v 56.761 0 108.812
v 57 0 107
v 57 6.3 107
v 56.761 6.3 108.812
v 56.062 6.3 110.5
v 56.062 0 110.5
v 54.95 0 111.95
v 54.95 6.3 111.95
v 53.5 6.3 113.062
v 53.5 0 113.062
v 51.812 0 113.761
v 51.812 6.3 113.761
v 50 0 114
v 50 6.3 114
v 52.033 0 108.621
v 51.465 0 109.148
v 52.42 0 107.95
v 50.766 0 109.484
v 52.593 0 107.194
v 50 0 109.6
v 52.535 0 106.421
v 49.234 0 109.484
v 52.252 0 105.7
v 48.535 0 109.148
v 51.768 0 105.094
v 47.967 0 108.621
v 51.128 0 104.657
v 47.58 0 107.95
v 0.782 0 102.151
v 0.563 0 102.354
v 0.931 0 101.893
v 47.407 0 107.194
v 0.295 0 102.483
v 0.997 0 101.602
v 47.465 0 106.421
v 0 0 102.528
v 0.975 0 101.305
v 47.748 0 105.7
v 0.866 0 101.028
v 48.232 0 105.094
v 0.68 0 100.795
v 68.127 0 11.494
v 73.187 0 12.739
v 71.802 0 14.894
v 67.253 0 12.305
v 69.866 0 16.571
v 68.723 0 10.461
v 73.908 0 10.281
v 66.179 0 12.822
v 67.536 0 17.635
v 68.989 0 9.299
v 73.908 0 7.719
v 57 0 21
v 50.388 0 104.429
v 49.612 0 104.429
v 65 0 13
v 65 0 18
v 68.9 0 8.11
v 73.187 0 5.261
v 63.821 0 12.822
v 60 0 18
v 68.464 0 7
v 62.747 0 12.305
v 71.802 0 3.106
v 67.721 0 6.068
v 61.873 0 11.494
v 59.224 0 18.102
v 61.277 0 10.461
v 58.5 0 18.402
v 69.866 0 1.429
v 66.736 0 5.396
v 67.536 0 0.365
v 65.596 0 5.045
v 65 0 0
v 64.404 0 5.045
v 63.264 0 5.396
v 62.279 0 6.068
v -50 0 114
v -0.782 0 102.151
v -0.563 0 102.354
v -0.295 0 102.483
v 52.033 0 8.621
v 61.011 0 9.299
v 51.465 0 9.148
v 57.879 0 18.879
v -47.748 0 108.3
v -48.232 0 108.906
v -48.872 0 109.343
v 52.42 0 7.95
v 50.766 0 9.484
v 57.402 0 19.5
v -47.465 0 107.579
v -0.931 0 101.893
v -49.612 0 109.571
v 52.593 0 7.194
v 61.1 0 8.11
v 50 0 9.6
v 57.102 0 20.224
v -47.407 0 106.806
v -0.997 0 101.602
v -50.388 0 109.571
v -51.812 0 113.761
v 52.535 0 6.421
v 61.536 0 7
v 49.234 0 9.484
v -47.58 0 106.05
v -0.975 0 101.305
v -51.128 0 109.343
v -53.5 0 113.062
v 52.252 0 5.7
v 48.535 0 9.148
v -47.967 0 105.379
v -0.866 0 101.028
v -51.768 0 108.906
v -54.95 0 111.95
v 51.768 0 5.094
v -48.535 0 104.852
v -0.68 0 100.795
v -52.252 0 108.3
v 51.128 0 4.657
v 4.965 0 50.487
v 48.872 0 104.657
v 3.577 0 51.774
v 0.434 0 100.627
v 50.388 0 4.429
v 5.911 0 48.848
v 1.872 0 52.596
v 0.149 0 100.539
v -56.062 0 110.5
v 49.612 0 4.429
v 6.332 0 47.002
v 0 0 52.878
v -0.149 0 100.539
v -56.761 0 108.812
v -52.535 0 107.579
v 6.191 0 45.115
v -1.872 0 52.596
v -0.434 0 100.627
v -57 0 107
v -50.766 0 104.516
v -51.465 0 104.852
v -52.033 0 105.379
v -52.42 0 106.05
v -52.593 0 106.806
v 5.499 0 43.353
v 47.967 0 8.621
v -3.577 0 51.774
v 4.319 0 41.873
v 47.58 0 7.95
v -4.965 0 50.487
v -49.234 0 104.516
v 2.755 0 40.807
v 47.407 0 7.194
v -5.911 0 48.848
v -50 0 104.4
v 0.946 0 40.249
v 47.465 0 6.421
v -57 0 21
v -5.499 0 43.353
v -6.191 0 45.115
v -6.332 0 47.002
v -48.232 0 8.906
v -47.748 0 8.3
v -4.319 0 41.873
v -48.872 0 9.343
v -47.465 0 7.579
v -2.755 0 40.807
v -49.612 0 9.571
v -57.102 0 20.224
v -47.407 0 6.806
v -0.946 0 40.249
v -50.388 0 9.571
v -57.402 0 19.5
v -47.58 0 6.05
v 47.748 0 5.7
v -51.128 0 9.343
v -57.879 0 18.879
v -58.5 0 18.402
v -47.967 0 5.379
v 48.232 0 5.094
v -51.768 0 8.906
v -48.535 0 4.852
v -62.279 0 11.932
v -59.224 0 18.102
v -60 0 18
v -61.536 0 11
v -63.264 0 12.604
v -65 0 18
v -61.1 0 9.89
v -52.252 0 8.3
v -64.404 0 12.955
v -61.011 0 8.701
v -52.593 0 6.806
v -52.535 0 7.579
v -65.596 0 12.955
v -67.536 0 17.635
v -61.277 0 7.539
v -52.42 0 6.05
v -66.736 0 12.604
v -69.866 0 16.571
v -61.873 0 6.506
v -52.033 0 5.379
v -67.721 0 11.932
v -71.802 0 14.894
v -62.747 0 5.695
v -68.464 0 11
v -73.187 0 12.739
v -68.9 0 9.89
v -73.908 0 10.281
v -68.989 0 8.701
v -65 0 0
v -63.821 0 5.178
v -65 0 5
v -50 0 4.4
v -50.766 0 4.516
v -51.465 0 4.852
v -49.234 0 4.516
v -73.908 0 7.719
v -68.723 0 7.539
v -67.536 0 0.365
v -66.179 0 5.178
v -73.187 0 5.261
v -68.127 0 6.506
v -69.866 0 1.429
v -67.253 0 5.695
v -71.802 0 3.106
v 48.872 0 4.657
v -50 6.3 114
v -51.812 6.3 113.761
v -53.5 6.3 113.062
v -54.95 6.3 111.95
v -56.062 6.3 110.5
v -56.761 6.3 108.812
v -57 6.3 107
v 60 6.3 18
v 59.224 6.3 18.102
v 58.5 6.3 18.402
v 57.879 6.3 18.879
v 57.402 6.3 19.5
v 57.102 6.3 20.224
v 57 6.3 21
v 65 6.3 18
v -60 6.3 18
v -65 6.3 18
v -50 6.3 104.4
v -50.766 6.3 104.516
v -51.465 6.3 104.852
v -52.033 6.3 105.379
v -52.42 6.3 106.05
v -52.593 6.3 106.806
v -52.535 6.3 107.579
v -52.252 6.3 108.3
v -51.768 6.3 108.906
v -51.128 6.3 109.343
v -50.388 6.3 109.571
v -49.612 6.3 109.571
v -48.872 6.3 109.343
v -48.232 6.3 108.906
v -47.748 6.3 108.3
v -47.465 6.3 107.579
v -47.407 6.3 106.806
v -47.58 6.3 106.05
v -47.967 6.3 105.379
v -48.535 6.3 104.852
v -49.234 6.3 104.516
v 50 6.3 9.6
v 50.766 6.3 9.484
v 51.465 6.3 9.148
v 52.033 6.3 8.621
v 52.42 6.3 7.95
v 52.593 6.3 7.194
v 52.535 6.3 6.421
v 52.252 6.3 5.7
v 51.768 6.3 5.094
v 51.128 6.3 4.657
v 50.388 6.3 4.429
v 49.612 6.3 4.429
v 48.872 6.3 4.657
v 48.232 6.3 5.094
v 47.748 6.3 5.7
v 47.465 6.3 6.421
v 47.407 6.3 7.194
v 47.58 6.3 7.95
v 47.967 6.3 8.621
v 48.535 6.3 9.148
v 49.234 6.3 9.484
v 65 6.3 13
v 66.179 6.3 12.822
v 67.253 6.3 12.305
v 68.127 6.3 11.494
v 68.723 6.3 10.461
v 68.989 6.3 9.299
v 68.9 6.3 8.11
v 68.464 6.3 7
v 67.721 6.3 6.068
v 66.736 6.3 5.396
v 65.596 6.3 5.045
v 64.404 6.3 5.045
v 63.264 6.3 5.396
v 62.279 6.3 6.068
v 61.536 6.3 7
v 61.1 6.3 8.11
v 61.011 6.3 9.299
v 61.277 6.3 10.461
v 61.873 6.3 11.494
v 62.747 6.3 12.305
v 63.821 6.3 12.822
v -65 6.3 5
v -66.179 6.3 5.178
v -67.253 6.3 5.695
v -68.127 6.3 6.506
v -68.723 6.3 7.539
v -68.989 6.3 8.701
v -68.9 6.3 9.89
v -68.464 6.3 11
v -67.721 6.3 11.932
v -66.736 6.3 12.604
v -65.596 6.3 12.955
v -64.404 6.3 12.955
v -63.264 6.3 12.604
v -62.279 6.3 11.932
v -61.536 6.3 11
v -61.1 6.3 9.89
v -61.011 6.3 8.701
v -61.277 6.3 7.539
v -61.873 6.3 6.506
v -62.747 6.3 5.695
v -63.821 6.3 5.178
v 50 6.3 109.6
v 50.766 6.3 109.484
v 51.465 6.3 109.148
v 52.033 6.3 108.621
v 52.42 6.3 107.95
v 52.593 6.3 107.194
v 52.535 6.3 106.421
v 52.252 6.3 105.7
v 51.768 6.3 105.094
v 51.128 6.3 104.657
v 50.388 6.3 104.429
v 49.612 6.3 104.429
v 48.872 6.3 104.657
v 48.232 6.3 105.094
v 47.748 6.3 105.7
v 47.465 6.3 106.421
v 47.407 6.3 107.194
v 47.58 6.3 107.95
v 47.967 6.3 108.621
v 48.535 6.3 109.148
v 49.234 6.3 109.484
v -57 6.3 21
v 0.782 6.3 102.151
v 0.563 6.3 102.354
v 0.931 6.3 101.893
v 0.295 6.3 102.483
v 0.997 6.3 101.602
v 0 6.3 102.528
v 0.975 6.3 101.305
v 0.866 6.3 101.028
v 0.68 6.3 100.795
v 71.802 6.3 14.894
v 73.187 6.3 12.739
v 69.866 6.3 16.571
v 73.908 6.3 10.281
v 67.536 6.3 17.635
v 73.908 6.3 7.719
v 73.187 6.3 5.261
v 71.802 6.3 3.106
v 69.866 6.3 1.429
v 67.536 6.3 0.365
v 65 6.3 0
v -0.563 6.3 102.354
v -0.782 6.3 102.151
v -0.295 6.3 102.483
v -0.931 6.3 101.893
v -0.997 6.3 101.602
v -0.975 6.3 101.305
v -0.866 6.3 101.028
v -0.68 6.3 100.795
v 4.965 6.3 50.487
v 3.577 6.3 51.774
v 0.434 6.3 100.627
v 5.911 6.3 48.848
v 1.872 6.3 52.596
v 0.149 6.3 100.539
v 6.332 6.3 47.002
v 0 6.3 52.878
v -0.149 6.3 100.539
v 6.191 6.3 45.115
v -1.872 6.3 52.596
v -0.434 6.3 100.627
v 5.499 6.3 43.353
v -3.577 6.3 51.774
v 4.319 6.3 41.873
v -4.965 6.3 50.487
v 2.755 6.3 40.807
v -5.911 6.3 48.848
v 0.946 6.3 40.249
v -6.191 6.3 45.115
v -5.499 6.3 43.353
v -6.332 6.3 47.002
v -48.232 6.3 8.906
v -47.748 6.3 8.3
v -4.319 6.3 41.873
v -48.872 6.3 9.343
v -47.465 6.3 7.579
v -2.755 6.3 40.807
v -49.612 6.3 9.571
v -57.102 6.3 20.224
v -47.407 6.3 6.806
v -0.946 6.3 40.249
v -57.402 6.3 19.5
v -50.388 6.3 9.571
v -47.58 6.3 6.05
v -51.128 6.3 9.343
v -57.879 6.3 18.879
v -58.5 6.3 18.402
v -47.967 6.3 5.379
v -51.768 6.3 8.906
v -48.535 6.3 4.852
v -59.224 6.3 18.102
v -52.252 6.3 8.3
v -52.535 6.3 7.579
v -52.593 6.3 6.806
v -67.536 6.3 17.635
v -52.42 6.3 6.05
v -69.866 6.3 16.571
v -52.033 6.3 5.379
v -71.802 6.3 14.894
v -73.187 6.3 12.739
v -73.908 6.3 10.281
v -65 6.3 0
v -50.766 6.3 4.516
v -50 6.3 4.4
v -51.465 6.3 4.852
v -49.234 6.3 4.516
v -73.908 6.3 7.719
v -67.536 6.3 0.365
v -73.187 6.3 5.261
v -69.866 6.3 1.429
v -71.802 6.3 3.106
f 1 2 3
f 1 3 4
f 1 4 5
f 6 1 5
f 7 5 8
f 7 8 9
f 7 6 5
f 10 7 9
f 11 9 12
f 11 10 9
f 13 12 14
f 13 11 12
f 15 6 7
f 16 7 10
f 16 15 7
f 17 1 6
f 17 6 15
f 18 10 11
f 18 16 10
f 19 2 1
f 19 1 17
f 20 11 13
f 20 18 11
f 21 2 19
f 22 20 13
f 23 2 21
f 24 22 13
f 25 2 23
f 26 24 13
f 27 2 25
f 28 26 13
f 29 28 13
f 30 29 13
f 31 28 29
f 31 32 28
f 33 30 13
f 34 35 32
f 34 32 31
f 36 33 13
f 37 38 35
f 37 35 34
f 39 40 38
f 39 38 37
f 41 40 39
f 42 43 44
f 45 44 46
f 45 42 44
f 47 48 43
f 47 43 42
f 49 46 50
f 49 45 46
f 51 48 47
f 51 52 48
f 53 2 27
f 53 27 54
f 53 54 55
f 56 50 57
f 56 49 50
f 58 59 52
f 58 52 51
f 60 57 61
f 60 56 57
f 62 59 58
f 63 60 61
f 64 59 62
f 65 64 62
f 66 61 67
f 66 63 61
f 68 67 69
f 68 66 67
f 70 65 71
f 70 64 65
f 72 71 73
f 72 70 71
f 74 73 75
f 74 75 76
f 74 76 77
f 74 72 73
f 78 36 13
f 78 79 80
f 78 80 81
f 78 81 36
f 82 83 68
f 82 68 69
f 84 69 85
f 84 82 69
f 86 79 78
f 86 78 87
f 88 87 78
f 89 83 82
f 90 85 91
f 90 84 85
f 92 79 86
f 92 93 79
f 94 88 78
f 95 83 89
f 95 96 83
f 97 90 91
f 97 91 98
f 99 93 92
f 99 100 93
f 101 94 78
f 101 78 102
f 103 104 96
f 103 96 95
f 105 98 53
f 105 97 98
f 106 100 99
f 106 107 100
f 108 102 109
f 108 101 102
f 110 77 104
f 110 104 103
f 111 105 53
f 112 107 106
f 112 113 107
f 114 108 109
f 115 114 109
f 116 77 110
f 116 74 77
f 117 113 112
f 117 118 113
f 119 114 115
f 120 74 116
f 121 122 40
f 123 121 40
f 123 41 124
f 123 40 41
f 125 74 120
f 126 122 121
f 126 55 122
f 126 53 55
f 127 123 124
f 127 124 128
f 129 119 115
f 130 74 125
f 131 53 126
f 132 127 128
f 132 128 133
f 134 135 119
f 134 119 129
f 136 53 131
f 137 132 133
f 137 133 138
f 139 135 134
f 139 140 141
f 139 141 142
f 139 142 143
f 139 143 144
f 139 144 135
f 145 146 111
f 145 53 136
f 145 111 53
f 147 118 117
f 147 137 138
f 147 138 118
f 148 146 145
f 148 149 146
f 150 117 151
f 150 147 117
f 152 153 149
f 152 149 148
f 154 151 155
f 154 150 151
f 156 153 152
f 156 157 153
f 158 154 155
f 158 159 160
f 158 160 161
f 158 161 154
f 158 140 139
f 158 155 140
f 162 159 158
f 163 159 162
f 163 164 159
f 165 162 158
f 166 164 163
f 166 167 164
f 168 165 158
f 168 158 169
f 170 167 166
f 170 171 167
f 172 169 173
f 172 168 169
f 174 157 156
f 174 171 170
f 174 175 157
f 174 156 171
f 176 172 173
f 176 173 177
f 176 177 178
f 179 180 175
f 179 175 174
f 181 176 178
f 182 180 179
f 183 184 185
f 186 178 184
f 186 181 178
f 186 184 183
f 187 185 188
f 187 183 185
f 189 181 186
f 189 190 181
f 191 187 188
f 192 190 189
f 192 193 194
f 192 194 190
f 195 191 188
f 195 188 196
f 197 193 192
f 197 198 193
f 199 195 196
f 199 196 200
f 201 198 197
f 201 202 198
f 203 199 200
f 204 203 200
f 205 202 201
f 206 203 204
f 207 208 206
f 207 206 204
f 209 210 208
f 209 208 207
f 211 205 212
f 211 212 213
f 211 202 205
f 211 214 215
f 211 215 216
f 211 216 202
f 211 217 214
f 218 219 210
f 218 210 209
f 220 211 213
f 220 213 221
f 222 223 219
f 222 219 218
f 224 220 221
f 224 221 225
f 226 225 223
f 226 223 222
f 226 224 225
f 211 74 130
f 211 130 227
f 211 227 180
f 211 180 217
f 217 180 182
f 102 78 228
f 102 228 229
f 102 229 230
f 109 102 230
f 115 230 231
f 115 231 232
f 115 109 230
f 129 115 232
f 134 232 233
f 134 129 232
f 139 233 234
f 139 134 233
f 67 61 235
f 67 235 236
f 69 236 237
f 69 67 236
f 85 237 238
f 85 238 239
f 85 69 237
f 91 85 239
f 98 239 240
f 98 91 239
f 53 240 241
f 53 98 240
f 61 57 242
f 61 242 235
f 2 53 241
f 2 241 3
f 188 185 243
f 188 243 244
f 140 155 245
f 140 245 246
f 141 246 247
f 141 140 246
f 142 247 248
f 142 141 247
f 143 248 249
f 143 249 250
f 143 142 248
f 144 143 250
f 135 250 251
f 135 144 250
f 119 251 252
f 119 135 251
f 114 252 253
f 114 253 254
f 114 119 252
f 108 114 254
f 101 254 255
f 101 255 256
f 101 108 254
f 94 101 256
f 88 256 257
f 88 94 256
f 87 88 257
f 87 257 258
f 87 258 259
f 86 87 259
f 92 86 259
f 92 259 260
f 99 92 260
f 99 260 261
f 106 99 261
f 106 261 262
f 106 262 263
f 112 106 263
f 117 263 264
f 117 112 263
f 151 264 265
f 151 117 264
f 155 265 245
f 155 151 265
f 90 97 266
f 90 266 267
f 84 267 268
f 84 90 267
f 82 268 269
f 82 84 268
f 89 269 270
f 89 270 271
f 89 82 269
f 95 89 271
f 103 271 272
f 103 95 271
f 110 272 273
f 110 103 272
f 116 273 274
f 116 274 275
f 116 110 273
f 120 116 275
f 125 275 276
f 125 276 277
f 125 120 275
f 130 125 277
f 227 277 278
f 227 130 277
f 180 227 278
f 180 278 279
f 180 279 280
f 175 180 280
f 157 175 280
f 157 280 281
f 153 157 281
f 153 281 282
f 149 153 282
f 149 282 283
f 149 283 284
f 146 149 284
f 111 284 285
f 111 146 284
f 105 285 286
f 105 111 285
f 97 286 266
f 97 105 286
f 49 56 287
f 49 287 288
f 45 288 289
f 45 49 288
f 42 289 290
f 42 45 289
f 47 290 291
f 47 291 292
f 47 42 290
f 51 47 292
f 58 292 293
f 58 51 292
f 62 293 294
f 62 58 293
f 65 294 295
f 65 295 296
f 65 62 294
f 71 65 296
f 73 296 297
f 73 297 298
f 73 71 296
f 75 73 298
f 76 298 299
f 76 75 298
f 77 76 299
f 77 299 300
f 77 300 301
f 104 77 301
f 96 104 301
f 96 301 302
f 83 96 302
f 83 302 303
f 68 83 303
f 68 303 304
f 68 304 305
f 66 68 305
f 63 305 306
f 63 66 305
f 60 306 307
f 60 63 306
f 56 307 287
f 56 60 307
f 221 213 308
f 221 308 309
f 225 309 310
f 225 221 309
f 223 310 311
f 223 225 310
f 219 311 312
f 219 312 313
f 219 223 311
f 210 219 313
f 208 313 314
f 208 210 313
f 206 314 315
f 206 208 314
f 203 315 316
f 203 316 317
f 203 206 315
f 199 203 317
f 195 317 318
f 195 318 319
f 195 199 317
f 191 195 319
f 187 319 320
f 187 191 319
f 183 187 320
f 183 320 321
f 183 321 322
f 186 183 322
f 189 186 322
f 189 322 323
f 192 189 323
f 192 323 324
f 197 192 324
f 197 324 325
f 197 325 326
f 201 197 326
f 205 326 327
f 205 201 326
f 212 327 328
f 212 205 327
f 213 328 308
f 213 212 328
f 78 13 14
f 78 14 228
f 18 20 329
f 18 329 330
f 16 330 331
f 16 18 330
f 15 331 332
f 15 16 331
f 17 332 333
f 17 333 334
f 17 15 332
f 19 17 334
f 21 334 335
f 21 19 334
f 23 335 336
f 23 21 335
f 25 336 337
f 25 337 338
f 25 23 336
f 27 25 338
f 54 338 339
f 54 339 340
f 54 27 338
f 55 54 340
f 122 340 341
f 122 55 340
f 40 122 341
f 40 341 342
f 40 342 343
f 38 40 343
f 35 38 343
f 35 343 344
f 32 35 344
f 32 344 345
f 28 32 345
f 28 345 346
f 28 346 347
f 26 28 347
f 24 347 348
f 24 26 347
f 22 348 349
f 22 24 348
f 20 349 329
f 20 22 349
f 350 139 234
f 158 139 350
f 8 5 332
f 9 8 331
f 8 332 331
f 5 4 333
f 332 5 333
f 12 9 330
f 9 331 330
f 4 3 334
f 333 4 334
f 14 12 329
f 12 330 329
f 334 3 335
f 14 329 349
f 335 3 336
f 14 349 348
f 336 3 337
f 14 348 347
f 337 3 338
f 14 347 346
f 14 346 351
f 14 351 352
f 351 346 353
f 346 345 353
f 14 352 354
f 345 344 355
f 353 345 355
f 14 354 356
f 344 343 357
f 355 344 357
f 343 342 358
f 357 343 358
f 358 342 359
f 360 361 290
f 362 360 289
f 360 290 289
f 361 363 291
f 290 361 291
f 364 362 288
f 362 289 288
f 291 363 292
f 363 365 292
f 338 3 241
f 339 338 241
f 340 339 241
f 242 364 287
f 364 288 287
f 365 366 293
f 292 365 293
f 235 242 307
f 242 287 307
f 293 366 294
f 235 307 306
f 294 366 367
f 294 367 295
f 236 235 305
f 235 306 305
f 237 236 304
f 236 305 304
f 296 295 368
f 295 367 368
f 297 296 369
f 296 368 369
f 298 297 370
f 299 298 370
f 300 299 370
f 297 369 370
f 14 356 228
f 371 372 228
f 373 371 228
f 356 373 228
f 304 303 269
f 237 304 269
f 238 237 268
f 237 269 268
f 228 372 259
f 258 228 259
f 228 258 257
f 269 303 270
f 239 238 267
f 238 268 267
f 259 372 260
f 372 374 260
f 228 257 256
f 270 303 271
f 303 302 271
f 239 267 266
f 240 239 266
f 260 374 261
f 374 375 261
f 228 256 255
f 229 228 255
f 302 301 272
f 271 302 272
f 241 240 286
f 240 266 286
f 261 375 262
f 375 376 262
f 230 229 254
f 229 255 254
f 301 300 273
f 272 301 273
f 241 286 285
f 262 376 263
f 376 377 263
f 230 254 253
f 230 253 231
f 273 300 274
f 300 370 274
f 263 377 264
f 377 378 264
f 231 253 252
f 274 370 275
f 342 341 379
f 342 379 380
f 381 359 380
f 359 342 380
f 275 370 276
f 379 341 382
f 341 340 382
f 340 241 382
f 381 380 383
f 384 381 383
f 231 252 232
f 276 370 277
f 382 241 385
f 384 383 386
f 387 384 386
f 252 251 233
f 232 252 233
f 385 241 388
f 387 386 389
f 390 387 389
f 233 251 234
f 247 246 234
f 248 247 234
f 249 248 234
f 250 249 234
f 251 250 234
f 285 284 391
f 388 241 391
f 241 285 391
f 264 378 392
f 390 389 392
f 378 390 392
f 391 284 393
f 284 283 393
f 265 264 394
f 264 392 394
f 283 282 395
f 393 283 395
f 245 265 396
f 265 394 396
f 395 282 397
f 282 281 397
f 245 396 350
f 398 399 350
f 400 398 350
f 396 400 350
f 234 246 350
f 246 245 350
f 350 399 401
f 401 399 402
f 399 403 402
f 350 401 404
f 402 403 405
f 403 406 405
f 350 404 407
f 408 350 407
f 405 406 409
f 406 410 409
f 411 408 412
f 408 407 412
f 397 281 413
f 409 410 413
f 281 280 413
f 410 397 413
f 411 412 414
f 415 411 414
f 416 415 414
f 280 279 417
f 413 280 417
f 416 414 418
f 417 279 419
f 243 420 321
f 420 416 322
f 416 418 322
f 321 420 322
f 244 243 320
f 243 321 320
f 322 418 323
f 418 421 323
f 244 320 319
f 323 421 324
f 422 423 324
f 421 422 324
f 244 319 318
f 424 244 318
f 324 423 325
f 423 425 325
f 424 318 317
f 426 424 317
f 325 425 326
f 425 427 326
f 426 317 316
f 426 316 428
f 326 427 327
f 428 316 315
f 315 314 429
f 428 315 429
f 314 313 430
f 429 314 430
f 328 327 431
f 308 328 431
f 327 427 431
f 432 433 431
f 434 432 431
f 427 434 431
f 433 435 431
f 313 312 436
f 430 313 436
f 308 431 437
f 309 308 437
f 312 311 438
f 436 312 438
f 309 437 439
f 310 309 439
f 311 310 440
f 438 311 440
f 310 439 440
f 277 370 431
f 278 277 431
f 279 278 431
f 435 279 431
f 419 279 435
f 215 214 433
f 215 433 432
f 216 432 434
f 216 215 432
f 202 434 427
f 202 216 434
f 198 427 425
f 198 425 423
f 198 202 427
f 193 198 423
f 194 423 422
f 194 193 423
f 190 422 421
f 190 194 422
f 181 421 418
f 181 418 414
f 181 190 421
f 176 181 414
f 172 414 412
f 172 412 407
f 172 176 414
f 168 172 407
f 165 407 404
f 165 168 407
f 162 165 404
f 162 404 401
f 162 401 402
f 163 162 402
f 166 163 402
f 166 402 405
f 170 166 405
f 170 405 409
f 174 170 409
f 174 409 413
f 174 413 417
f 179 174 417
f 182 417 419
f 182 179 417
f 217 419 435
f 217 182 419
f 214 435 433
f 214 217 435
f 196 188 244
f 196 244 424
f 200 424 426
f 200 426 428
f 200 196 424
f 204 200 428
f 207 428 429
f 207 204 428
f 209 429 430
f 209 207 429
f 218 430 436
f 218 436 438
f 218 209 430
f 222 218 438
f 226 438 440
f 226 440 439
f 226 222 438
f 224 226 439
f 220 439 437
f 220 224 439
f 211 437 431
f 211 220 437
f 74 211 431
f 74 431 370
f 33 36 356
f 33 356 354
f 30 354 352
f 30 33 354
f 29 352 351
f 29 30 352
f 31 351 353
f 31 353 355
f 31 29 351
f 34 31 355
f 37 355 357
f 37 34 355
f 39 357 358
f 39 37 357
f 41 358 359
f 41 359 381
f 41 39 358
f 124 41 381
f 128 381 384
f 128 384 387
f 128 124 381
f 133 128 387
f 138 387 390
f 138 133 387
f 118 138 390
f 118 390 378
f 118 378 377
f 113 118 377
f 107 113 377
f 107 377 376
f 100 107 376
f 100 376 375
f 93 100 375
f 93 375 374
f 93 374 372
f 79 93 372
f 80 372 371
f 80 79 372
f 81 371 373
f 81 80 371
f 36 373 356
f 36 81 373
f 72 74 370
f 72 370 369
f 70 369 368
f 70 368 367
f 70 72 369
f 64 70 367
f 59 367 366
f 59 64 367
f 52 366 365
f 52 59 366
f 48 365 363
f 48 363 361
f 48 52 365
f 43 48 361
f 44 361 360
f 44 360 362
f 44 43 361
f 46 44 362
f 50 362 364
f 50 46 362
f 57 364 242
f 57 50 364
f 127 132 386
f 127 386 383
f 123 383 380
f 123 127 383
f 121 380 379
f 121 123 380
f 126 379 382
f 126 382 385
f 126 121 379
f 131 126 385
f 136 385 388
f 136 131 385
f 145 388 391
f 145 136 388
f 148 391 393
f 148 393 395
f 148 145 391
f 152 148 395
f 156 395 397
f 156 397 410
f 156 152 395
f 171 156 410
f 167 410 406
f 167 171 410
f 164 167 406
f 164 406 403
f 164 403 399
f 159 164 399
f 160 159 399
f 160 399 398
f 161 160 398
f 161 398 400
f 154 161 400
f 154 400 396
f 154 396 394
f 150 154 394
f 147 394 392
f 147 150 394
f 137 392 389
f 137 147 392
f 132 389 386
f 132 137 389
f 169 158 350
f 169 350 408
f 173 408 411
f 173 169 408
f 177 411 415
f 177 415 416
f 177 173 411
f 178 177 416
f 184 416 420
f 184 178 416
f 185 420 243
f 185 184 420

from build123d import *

# Parameters (mm, degrees)
SKETCH1_R           = 2.6
SKETCH1_R_2         = 4
SKETCH1_R_3         = 6.35
SKETCH1_R_4         = 1
BOSS_EXTRUDE2_DEPTH = 6.3


with BuildPart() as part:
    # Sketch1 → Boss-Extrude2 (new body)
    with BuildSketch(Plane(origin=(0, 0, 0), x_dir=(1, 0, 0), z_dir=(0, 1, 0))):
        with BuildLine():
            Line((-65, 0), (65, 0))
            ThreePointArc((65, 0), (74, -9), (65, -18))
            Line((65, -18), (60, -18))
            ThreePointArc((60, -18), (57.878679656, -18.878679656), (57, -21))
            Line((57, -21), (57, -107))
            ThreePointArc((57, -107), (54.949747468, -111.949747468), (50, -114))
            Line((50, -114), (-50, -114))
            ThreePointArc((-50, -114), (-54.949747468, -111.949747468), (-57, -107))
            Line((-57, -107), (-57, -21))
            ThreePointArc((-57, -21), (-57.878679656, -18.878679656), (-60, -18))
            Line((-60, -18), (-65, -18))
            ThreePointArc((-65, -18), (-74, -9), (-65, 0))
        make_face()
        with Locations(Location((-50, -107, 0), (0, 0, 90))):
            Circle(SKETCH1_R, mode=Mode.SUBTRACT)
        with Locations(Location((50, -7, 0), (0, 0, 270))):
            Circle(SKETCH1_R, mode=Mode.SUBTRACT)
        with Locations(Location((65, -9, 0), (0, 0, 270))):
            Circle(SKETCH1_R_2, mode=Mode.SUBTRACT)
        with Locations(Location((50, -107, 0), (0, 0, 270))):
            Circle(SKETCH1_R, mode=Mode.SUBTRACT)
        with Locations(Location((0, -46.527767497, 0), (0, 0, 270))):
            Circle(SKETCH1_R_3, mode=Mode.SUBTRACT)
        with Locations(Location((0, -101.527767497, 0), (0, 0, 270))):
            Circle(SKETCH1_R_4, mode=Mode.SUBTRACT)
        with Locations(Location((-65, -9, 0), (0, 0, 90))):
            Circle(SKETCH1_R_2, mode=Mode.SUBTRACT)
        with Locations(Location((-50, -7, 0), (0, 0, 90))):
            Circle(SKETCH1_R, mode=Mode.SUBTRACT)
    extrude(amount=BOSS_EXTRUDE2_DEPTH)


solid = part.part
